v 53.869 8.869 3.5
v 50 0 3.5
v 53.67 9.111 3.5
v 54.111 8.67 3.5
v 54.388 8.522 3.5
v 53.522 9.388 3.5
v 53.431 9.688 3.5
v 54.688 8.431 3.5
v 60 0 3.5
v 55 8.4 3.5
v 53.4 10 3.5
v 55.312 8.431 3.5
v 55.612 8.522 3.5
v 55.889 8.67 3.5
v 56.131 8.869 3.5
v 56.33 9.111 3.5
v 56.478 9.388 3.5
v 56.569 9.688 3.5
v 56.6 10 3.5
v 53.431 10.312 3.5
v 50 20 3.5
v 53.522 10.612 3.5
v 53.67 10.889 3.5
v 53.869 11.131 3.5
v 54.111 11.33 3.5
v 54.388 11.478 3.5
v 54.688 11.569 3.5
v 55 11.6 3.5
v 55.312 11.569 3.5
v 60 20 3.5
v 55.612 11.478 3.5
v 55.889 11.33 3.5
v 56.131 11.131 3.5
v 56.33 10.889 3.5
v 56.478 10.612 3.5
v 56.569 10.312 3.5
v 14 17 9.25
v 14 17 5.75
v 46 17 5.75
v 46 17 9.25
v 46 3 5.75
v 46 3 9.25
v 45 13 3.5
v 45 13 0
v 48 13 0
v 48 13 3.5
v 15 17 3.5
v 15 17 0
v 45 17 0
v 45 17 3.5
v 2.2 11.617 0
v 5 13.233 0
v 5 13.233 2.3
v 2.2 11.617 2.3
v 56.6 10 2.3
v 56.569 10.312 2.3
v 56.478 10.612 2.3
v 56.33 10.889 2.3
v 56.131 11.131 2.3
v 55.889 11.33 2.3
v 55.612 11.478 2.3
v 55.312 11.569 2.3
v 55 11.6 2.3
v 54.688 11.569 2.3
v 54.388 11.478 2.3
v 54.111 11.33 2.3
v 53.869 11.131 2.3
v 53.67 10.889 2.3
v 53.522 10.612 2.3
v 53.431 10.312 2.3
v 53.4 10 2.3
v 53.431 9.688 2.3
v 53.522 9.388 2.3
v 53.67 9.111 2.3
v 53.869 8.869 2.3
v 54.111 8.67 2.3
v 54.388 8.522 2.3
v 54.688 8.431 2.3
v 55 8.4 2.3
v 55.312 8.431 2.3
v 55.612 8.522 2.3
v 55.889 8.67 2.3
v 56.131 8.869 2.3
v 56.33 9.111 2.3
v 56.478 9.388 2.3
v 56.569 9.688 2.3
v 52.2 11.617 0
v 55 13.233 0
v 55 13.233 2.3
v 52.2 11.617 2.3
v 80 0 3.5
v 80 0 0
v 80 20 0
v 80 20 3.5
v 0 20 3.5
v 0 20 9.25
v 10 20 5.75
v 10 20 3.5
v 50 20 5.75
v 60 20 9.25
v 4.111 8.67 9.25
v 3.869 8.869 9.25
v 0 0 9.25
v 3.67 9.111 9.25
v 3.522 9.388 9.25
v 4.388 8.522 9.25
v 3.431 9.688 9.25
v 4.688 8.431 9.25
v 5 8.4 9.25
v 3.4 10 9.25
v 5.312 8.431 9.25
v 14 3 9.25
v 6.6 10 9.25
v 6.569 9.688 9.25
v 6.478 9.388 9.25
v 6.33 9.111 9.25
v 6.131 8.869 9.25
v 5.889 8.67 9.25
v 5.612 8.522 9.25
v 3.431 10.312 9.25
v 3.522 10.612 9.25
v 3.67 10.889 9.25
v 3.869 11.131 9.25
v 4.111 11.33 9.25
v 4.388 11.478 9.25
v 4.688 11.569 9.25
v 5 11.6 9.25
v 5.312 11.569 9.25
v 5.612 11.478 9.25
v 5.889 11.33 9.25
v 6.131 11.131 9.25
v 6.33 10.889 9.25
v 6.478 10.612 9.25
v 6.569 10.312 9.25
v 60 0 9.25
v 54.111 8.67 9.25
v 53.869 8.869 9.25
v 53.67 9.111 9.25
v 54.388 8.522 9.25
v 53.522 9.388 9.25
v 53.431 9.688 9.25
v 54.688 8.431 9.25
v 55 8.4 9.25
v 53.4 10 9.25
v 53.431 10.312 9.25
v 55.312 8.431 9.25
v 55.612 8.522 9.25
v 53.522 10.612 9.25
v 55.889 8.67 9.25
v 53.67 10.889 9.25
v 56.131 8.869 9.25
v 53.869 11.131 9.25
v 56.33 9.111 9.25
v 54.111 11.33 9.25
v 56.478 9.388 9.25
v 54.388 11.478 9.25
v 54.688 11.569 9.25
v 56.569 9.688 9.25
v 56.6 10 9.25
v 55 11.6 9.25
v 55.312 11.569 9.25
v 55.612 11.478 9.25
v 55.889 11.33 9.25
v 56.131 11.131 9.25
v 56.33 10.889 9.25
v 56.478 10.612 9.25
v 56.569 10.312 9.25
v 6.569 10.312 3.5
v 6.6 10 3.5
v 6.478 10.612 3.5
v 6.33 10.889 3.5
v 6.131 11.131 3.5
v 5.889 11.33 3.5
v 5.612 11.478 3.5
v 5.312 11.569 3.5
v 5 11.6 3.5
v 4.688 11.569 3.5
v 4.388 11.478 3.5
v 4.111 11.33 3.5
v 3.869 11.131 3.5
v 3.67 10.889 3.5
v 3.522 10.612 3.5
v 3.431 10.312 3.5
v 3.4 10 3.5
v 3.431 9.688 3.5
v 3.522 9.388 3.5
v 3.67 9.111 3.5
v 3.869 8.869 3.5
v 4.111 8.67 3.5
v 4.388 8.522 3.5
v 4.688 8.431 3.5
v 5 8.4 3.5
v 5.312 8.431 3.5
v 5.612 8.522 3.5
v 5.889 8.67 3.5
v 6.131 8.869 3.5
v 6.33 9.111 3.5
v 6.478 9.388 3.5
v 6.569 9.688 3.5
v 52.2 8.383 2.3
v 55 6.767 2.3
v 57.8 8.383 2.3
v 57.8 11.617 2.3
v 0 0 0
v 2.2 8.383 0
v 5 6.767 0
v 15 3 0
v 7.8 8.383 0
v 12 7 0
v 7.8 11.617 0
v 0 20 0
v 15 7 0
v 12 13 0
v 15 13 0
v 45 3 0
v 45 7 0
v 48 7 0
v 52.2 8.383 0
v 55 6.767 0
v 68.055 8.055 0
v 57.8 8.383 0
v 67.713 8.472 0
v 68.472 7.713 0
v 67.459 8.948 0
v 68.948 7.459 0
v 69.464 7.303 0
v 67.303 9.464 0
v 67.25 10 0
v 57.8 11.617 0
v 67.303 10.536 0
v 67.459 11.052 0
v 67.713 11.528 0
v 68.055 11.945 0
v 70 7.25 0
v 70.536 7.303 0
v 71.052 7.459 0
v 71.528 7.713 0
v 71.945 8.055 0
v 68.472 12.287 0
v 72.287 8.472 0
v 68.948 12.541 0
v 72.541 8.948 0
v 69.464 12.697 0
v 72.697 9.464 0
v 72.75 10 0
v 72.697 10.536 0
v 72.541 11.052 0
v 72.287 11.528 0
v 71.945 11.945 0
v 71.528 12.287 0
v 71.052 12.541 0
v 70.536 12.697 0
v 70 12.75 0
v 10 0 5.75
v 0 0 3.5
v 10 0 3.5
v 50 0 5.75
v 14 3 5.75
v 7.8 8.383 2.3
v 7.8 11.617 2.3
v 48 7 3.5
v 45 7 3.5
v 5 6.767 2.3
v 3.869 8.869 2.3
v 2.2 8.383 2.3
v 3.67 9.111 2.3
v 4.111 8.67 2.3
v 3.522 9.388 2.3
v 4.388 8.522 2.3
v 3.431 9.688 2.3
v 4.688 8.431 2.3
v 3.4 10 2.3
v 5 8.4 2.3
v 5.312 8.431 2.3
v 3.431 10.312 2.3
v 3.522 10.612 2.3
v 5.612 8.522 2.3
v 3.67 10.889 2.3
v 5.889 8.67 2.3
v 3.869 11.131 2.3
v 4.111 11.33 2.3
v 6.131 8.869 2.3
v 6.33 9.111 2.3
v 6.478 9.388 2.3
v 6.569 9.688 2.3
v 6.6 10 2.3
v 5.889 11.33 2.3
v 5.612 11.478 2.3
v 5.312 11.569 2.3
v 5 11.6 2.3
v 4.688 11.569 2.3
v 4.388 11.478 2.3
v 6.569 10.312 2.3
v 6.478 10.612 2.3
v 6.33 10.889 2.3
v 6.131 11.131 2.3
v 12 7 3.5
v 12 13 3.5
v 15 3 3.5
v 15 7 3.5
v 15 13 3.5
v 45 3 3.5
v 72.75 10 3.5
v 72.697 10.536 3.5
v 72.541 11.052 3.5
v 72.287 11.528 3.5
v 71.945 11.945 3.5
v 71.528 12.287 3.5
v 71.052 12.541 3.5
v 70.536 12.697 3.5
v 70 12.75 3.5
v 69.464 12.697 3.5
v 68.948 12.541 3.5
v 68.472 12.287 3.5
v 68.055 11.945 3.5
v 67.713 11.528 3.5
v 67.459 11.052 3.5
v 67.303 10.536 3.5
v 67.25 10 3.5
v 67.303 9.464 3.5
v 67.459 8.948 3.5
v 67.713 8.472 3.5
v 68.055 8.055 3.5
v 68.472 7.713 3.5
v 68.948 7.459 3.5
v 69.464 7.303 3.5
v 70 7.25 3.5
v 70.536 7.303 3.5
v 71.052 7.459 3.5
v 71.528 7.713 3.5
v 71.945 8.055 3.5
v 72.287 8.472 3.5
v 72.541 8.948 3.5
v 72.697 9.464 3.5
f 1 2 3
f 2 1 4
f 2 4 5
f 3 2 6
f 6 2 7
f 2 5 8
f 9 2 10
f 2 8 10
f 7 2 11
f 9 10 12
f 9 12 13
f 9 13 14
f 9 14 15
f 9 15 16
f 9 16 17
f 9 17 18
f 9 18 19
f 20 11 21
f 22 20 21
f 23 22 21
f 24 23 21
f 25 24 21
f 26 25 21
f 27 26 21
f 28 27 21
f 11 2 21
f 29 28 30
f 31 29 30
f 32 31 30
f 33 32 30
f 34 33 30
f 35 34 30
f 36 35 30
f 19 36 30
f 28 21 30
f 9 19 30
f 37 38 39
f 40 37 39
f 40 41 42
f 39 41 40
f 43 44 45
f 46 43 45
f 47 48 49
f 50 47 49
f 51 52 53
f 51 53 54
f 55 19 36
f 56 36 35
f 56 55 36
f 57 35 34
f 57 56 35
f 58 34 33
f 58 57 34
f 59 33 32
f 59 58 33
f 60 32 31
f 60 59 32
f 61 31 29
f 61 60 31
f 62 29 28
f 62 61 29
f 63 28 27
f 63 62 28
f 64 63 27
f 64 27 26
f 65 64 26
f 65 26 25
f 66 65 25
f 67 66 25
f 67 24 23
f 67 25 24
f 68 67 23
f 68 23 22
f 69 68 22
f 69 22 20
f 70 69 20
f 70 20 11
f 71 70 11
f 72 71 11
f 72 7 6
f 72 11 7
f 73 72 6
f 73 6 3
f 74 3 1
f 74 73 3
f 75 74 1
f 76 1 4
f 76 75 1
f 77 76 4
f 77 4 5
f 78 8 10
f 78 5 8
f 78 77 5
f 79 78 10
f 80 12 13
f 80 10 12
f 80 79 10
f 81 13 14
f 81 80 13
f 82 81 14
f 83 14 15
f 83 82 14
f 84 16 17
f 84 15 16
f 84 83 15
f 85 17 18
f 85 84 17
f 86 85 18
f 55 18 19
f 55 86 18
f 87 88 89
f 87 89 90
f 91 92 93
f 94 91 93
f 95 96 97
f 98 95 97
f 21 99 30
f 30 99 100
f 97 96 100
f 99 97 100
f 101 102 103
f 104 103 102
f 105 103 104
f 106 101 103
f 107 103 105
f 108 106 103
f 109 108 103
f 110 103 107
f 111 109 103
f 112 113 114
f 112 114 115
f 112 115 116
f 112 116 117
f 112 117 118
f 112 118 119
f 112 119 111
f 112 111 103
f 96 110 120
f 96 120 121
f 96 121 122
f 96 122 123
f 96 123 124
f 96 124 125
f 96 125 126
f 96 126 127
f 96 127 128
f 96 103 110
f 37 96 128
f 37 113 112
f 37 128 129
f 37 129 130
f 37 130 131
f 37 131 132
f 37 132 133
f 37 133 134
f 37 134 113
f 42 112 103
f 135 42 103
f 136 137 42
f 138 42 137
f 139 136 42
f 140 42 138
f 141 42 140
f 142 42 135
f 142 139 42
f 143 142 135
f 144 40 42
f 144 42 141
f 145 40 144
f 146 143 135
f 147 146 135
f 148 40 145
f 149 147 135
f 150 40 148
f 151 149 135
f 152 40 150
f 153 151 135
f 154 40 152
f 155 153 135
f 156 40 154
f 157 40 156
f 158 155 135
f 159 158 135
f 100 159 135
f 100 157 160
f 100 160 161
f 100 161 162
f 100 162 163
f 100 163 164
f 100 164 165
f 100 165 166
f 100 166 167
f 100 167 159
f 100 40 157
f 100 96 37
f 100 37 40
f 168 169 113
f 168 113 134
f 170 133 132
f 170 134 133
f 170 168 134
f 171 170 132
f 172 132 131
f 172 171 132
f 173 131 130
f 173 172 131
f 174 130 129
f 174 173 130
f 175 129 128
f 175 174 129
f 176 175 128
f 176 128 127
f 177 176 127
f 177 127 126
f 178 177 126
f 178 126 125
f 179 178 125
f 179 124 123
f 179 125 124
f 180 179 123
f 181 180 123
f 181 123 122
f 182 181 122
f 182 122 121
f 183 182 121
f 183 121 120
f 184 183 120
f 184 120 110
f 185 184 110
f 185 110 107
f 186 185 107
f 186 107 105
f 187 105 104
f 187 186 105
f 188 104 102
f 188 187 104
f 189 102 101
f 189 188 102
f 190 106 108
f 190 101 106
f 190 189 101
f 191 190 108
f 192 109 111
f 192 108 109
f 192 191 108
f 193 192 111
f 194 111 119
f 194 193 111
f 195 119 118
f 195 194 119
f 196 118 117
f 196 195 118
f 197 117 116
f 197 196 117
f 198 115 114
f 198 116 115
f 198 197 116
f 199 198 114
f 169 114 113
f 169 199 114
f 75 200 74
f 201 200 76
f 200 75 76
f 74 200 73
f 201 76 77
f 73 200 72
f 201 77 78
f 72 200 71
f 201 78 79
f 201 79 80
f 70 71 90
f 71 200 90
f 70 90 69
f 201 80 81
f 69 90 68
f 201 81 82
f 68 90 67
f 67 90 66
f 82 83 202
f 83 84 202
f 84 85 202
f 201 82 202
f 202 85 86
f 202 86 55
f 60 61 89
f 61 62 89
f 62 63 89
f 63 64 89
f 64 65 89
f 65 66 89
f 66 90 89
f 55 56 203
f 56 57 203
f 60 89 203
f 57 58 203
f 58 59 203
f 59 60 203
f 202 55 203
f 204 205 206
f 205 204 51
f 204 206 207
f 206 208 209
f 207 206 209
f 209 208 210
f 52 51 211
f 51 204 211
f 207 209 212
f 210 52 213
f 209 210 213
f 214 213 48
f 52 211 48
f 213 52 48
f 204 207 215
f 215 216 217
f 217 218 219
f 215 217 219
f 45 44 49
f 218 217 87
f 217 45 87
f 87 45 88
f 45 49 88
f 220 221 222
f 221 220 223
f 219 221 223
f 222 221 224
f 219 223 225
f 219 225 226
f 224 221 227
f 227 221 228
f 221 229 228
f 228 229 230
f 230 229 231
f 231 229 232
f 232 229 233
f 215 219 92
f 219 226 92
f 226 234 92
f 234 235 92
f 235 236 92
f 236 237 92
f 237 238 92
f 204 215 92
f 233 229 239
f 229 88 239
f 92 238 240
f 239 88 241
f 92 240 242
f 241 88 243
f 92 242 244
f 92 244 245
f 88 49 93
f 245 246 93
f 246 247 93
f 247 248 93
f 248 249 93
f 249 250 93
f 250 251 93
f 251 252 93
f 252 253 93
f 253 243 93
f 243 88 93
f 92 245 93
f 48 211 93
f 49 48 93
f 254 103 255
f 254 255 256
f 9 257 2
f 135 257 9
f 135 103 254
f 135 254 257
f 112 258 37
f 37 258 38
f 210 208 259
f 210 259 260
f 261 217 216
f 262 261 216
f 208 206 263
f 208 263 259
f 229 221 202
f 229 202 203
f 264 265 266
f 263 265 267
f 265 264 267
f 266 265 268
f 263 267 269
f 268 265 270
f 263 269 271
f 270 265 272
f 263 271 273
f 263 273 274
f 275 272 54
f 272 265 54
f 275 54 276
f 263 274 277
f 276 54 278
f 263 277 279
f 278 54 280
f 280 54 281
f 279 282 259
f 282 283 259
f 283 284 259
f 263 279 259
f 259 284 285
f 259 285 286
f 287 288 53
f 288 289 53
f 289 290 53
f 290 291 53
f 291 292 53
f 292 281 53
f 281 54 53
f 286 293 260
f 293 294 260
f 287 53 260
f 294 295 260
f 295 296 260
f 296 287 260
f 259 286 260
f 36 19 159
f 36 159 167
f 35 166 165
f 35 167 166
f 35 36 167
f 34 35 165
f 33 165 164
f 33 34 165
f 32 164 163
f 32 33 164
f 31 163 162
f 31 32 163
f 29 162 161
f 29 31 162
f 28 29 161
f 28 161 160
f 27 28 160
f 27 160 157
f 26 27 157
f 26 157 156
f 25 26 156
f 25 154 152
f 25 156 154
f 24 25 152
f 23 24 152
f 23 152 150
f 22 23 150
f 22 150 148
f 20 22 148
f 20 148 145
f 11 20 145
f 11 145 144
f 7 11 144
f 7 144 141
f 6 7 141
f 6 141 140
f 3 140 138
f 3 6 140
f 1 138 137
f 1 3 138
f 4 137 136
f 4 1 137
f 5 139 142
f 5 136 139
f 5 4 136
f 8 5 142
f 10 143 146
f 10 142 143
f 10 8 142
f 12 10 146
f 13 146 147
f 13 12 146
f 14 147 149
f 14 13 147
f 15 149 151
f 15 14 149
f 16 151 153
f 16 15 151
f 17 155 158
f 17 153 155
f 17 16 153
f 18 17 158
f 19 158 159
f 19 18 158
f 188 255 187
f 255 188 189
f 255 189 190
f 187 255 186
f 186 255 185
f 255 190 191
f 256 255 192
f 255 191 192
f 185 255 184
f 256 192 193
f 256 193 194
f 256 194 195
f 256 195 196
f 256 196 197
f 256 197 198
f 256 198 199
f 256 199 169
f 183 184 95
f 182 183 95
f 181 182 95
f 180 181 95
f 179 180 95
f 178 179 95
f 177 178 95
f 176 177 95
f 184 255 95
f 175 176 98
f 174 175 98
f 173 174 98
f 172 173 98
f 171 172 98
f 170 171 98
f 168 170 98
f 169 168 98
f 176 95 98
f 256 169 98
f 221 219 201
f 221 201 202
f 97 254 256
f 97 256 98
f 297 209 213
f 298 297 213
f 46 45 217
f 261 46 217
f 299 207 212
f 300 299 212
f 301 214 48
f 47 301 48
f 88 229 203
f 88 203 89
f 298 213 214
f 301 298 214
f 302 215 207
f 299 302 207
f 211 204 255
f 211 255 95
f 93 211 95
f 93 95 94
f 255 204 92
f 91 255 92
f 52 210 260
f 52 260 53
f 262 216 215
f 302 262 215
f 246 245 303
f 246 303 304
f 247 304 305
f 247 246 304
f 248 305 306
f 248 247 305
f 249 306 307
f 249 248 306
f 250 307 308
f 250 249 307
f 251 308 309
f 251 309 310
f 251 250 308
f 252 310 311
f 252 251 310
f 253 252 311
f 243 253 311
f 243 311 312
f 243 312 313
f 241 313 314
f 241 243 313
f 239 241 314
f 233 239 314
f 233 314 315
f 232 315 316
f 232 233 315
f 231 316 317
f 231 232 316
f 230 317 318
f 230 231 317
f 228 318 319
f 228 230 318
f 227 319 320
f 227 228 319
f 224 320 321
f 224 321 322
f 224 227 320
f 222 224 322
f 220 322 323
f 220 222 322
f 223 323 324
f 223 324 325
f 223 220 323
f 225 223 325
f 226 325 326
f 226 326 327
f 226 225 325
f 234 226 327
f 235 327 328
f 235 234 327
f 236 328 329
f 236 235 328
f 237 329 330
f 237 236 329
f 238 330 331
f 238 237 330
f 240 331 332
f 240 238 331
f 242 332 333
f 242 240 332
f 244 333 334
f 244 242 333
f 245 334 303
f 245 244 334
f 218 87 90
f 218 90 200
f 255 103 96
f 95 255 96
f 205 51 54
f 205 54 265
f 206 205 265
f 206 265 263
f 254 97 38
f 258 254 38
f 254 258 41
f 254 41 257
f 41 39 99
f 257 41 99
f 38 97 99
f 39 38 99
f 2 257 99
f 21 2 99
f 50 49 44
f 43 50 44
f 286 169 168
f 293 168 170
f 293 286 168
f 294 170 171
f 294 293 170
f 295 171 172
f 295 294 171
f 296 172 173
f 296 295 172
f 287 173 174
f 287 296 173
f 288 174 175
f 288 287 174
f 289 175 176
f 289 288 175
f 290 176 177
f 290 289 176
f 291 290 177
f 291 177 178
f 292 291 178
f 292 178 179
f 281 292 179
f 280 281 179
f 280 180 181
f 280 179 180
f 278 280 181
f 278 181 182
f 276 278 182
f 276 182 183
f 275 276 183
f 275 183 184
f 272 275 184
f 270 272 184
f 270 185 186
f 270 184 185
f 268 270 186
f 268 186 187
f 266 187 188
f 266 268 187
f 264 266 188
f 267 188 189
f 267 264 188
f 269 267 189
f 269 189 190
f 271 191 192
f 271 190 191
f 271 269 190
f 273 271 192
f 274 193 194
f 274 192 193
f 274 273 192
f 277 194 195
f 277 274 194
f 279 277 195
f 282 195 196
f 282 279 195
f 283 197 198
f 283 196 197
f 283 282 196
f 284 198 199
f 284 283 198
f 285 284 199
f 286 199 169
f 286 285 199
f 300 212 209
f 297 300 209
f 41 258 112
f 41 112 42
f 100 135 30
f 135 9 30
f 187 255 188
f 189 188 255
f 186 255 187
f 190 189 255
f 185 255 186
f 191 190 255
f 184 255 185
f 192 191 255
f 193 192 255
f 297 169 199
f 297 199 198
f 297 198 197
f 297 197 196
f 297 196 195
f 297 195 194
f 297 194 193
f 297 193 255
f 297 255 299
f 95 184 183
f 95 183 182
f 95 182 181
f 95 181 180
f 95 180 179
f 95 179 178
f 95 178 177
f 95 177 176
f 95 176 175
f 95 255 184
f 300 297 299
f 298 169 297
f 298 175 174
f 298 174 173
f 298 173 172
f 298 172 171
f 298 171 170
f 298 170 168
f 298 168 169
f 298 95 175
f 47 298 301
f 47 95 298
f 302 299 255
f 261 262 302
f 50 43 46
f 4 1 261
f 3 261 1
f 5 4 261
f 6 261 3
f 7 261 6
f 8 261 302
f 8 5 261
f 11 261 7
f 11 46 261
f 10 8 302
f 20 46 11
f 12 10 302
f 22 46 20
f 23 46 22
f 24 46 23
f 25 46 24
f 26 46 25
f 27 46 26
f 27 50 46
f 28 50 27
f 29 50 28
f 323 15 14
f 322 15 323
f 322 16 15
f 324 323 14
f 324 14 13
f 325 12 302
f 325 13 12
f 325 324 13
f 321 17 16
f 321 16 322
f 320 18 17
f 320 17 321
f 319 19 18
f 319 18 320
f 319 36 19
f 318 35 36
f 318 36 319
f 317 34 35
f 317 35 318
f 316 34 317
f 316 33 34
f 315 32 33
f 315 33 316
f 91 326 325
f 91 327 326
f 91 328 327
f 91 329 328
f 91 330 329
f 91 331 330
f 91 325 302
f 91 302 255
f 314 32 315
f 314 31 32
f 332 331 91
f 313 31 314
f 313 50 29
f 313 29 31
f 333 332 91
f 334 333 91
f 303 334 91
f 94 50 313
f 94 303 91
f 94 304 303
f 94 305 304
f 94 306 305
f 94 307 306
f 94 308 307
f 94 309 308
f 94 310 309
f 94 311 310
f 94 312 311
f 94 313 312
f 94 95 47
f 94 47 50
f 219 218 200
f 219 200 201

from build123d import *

# Parameters (mm, degrees)
F0_W     = 80
F0_H     = 20
F0_R     = 2.75
F1_DEPTH = 3.5
F3_W     = 60
F3_H     = 20
F3_W_2   = 32
F3_H_2   = 14
F4_DEPTH = 3.5
F5_W     = 10
F5_H     = 20
F6_DEPTH = 5.75
F7_R     = 1.6
F8_DEPTH = 9.251
F9_DEPTH = 2.3


with BuildPart() as f1:
    # F0 (on Top) → F1 (new body)
    with BuildSketch(Plane.XY):
        with Locations((40, 10)):
            Rectangle(F0_W, F0_H)
        Polygon((15, 13), (15, 17), (45, 17), (45, 13), (48, 13), (48, 7), (45, 7), (45, 3), (15, 3), (15, 7), (12, 7), (12, 13), align=None, mode=Mode.SUBTRACT)
        with Locations((70, 10)):
            Circle(F0_R, mode=Mode.SUBTRACT)
    extrude(amount=F1_DEPTH)


with BuildPart() as f4:
    # F3 (on offset) → F4 (new body)
    with BuildSketch(Plane.XY.offset(5.75)):
        with Locations((30, 10)):
            Rectangle(F3_W, F3_H)
        with Locations((30, 10)):
            Rectangle(F3_W_2, F3_H_2, mode=Mode.SUBTRACT)
    extrude(amount=F4_DEPTH)

    # F5 (on face) → F6 (join, through all)
    with BuildSketch(Plane.XY.offset(9.25)):
        with Locations((5, 10)):
            Rectangle(F5_W, F5_H)
        with Locations((55, 10)):
            Rectangle(F5_W, F5_H)
    extrude(amount=-F6_DEPTH)


with BuildPart() as f8_tool:
    # F7 (on face) → F8 (new body, through all)
    with BuildSketch(Plane.XY):
        with Locations((5, 10)):
            Circle(F7_R)
        with Locations((55, 10)):
            Circle(F7_R)
    extrude(amount=F8_DEPTH)


with BuildPart() as f1_1:
    add(f1.part)

    # F8: cut by f8_tool
    add(f8_tool.part, mode=Mode.SUBTRACT)

    # F7 (on face) → F9 (cut)
    with BuildSketch(Plane.XY):
        Polygon((2.2, 11.6165807537), (2.2, 8.3834192463), (5, 6.7668384925), (7.8, 8.3834192463), (7.8, 11.6165807537), (5, 13.2331615075), align=None)
        with Locations((5, 10)):
            Circle(F7_R, mode=Mode.SUBTRACT)
        Polygon((55, 6.7668384925), (57.8, 8.3834192463), (57.8, 11.6165807537), (55, 13.2331615075), (52.2, 11.6165807537), (52.2, 8.3834192463), align=None)
        with Locations((55, 10)):
            Circle(F7_R, mode=Mode.SUBTRACT)
    extrude(amount=F9_DEPTH, mode=Mode.SUBTRACT)


with BuildPart() as f4_1:
    add(f4.part)

    # F8: cut by f8_tool
    add(f8_tool.part, mode=Mode.SUBTRACT)


solid = Compound([f1_1.part, f4_1.part])
